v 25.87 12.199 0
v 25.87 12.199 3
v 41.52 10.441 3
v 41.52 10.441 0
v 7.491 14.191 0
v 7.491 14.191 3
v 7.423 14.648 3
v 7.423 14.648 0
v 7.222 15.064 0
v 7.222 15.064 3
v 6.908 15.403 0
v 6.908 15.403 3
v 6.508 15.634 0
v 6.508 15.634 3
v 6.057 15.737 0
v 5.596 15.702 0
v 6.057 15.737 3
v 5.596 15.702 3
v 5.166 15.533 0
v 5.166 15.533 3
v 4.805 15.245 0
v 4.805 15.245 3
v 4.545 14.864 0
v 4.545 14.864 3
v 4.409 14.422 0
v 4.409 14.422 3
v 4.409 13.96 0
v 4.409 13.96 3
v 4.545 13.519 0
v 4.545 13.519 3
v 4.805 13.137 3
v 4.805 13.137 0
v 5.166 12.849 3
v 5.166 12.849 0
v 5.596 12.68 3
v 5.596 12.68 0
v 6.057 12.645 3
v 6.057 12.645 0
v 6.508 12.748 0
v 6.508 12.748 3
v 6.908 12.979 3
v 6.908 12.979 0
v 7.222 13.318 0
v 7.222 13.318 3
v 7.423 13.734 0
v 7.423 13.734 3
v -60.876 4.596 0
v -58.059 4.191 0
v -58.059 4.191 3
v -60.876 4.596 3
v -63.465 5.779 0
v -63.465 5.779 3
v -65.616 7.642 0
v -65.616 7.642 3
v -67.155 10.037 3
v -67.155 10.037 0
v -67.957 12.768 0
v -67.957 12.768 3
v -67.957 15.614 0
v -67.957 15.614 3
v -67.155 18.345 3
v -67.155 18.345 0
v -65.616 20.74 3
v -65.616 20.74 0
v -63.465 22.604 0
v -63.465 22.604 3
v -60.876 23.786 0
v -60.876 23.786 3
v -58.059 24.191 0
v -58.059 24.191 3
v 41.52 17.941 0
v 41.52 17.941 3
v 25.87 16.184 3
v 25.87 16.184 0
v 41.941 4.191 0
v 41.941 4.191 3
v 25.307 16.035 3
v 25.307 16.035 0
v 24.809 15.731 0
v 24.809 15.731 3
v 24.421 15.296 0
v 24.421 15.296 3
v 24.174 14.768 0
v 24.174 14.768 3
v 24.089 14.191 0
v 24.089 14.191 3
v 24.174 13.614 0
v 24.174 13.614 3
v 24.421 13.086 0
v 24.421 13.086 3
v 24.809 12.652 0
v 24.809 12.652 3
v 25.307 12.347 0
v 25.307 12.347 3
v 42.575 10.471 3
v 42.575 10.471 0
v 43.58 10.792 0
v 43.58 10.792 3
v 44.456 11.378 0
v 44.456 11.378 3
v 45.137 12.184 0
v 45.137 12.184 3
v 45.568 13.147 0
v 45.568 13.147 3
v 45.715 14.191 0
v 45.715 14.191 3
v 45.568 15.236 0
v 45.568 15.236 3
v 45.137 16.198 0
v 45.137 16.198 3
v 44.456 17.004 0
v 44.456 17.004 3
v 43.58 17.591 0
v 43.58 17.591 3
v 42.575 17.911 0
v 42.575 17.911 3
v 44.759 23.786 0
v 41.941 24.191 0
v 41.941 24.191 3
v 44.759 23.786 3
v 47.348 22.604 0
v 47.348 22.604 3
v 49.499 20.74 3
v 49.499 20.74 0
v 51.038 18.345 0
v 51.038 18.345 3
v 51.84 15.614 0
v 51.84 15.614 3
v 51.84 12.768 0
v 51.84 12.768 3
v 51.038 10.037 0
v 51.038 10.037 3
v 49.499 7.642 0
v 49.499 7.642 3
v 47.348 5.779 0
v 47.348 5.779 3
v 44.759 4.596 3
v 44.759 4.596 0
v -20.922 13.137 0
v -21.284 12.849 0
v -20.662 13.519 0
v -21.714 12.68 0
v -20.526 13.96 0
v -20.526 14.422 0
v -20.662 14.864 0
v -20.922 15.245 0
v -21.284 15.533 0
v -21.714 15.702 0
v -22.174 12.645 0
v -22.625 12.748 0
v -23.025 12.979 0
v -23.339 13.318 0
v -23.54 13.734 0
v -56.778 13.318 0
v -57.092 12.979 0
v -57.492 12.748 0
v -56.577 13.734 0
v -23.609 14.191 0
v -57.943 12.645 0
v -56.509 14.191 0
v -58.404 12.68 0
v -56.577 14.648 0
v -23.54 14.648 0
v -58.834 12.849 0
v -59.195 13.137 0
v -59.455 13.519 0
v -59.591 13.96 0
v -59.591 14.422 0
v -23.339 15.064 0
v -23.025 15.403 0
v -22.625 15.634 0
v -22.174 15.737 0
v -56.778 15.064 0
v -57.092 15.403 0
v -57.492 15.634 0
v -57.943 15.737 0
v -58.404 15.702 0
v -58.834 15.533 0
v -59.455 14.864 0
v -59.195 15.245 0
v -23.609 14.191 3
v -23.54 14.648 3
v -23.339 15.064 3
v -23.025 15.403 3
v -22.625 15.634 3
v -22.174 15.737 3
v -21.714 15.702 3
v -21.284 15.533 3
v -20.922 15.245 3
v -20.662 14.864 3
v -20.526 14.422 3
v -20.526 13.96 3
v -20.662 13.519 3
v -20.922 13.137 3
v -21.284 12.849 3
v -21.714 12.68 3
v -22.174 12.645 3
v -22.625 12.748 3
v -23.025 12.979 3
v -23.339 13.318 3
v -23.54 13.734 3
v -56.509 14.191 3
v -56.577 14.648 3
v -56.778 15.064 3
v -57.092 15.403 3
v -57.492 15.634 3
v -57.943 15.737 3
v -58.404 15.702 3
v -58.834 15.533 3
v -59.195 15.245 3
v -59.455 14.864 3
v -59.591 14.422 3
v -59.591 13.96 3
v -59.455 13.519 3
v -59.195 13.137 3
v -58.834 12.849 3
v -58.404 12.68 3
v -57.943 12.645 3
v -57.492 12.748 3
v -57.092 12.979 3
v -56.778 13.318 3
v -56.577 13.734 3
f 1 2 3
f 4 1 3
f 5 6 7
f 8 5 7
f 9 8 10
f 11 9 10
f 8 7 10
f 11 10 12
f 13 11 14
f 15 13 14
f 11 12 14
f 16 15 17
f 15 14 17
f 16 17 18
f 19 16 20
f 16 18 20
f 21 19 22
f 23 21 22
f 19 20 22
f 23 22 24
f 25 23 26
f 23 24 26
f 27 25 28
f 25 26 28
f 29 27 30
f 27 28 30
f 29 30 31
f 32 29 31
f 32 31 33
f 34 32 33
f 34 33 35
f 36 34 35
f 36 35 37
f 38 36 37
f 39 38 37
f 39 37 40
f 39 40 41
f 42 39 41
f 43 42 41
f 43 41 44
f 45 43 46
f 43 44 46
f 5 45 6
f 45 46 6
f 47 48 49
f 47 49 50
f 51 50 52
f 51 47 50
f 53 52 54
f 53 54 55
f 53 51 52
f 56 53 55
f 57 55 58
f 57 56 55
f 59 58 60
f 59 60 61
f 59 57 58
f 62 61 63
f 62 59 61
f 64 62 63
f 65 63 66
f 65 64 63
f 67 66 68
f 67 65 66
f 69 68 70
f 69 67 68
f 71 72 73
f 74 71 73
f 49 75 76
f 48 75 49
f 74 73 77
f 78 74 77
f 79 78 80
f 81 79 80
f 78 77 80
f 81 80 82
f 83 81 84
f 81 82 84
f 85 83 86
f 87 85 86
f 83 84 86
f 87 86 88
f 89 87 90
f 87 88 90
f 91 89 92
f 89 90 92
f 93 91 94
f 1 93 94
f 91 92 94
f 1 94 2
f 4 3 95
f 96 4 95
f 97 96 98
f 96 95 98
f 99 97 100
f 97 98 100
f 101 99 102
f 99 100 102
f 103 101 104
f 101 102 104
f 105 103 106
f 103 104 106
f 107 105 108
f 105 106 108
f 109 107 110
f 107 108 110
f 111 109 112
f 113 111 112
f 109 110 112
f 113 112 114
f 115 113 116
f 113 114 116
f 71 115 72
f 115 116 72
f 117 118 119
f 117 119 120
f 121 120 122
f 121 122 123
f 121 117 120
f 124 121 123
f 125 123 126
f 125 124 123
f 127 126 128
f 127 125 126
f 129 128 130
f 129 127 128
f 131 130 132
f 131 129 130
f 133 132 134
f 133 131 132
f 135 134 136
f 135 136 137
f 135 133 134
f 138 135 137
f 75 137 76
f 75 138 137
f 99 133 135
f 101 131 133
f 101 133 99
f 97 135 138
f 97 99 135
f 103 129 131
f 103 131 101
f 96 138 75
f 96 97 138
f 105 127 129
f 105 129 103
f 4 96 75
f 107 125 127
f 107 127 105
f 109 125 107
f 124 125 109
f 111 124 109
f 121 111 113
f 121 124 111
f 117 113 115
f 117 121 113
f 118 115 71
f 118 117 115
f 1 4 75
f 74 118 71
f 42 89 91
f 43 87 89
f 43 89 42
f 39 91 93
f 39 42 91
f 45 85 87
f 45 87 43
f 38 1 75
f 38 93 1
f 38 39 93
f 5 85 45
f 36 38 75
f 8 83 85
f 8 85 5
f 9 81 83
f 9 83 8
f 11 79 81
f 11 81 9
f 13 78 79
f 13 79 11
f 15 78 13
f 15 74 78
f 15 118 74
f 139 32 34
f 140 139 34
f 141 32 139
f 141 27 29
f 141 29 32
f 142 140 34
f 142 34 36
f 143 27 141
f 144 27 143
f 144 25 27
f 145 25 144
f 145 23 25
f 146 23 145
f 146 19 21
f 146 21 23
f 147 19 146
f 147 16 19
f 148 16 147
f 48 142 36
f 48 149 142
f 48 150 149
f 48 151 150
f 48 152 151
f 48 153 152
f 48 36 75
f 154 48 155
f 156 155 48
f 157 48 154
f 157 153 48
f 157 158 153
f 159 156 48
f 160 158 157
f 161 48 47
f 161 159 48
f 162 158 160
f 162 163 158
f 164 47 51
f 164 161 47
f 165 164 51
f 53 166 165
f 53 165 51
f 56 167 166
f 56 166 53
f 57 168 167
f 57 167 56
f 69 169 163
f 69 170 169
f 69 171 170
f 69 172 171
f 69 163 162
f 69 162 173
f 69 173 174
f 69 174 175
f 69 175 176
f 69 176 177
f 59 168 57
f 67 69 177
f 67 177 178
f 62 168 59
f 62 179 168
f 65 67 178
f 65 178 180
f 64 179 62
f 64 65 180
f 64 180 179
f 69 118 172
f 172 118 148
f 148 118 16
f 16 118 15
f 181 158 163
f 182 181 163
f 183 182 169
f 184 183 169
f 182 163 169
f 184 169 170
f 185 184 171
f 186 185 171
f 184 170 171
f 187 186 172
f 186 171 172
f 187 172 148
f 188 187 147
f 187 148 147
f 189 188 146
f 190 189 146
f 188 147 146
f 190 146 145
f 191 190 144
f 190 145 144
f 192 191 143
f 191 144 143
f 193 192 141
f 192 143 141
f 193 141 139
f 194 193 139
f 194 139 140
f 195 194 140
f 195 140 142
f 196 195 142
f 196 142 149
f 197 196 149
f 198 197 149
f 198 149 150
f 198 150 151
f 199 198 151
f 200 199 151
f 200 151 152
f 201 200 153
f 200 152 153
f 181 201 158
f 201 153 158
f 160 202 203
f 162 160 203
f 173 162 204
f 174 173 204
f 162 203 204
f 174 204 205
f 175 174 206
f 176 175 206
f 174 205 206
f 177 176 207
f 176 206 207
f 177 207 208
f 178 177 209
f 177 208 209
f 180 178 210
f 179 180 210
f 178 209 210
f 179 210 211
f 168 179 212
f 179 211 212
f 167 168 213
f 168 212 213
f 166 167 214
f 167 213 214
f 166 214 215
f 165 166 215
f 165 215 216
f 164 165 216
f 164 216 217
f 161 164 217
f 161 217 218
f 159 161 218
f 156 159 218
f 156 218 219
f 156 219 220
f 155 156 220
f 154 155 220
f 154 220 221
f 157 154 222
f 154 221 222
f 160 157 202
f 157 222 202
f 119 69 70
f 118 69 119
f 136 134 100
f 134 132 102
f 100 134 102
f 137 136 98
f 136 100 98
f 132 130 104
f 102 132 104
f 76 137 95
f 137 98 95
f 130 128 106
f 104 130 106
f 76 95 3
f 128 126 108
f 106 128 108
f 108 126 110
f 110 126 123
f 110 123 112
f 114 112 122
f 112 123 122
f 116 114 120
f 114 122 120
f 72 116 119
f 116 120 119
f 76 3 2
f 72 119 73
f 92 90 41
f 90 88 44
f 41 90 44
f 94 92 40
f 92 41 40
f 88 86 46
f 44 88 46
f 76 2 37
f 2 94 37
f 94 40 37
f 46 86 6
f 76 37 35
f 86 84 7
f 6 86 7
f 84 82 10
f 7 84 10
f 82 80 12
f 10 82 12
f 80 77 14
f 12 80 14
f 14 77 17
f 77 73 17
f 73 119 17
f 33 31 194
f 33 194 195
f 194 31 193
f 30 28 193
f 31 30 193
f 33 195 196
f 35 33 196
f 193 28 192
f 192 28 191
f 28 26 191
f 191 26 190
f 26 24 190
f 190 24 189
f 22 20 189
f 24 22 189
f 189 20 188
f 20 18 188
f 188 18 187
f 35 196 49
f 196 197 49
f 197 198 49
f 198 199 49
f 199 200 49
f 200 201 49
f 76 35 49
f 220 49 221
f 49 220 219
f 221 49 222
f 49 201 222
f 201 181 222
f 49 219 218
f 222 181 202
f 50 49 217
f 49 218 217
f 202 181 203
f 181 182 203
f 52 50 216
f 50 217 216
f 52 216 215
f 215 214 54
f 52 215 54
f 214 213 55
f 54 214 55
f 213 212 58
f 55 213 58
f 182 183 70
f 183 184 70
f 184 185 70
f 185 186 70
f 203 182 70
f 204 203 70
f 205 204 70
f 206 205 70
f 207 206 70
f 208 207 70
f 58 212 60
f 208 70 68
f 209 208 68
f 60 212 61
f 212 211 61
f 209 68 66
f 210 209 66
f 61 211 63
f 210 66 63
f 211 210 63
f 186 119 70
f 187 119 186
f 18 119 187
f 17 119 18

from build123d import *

# Parameters (mm, degrees)
BOSS_EXTRUDE1_DEPTH = 3
CUT_EXTRUDE1_DEPTH  = 3
SKETCH3_R           = 1.55
CUT_EXTRUDE2_DEPTH  = 3
SKETCH4_R           = 1.55
CUT_EXTRUDE4_DEPTH  = 3
SKETCH5_R           = 1.55
CUT_EXTRUDE6_DEPTH  = 3


with BuildPart() as part:
    # Sketch1 → Boss-Extrude1 (new body)
    with BuildSketch(Plane.XY):
        with BuildLine():
            Line((-58.058617241, 24.191090517), (41.941382759, 24.191090517))
            ThreePointArc((41.941382759, 24.191090517), (51.941382759, 14.191090517), (41.941382759, 4.191090517))
            Line((41.941382759, 4.191090517), (-58.058617241, 4.191090517))
            ThreePointArc((-58.058617241, 4.191090517), (-68.058617241, 14.191090517), (-58.058617241, 24.191090517))
        make_face()
    extrude(amount=BOSS_EXTRUDE1_DEPTH)

    # Sketch2 → Cut-Extrude1 (cut)
    with BuildSketch(Plane.XY.offset(3)):
        with BuildLine():
            Line((41.520256561, 17.941090517), (25.870256561, 16.183590517))
            ThreePointArc((25.870256561, 16.183590517), (24.088990243, 14.191090517), (25.870256561, 12.198590517))
            Line((25.870256561, 12.198590517), (41.520256561, 10.441090517))
            ThreePointArc((41.520256561, 10.441090517), (45.714954976, 14.191090517), (41.520256561, 17.941090517))
        make_face()
    extrude(amount=-CUT_EXTRUDE1_DEPTH, mode=Mode.SUBTRACT)

    # Sketch3 → Cut-Extrude2 (cut)
    with BuildSketch(Plane.XY.offset(3)):
        with Locations((-58.058617241, 14.191090517)):
            Circle(SKETCH3_R)
    extrude(amount=-CUT_EXTRUDE2_DEPTH, mode=Mode.SUBTRACT)

    # Sketch4 → Cut-Extrude4 (cut)
    with BuildSketch(Plane(origin=(9.979459273, 1.433252018, 3), x_dir=(1, 0, 0), z_dir=(0, 0, 1))):
        with Locations((-4.038076514, 12.757838499)):
            Circle(SKETCH4_R)
    extrude(amount=-CUT_EXTRUDE4_DEPTH, mode=Mode.SUBTRACT)

    # Sketch5 → Cut-Extrude6 (cut)
    with BuildSketch(Plane(origin=(-9.979459273, 1.433252018, 0), x_dir=(-1, 0, 0), z_dir=(0, 0, -1))):
        with Locations((12.079157968, 12.757838499)):
            Circle(SKETCH5_R)
    extrude(amount=-CUT_EXTRUDE6_DEPTH, mode=Mode.SUBTRACT)


solid = part.part
